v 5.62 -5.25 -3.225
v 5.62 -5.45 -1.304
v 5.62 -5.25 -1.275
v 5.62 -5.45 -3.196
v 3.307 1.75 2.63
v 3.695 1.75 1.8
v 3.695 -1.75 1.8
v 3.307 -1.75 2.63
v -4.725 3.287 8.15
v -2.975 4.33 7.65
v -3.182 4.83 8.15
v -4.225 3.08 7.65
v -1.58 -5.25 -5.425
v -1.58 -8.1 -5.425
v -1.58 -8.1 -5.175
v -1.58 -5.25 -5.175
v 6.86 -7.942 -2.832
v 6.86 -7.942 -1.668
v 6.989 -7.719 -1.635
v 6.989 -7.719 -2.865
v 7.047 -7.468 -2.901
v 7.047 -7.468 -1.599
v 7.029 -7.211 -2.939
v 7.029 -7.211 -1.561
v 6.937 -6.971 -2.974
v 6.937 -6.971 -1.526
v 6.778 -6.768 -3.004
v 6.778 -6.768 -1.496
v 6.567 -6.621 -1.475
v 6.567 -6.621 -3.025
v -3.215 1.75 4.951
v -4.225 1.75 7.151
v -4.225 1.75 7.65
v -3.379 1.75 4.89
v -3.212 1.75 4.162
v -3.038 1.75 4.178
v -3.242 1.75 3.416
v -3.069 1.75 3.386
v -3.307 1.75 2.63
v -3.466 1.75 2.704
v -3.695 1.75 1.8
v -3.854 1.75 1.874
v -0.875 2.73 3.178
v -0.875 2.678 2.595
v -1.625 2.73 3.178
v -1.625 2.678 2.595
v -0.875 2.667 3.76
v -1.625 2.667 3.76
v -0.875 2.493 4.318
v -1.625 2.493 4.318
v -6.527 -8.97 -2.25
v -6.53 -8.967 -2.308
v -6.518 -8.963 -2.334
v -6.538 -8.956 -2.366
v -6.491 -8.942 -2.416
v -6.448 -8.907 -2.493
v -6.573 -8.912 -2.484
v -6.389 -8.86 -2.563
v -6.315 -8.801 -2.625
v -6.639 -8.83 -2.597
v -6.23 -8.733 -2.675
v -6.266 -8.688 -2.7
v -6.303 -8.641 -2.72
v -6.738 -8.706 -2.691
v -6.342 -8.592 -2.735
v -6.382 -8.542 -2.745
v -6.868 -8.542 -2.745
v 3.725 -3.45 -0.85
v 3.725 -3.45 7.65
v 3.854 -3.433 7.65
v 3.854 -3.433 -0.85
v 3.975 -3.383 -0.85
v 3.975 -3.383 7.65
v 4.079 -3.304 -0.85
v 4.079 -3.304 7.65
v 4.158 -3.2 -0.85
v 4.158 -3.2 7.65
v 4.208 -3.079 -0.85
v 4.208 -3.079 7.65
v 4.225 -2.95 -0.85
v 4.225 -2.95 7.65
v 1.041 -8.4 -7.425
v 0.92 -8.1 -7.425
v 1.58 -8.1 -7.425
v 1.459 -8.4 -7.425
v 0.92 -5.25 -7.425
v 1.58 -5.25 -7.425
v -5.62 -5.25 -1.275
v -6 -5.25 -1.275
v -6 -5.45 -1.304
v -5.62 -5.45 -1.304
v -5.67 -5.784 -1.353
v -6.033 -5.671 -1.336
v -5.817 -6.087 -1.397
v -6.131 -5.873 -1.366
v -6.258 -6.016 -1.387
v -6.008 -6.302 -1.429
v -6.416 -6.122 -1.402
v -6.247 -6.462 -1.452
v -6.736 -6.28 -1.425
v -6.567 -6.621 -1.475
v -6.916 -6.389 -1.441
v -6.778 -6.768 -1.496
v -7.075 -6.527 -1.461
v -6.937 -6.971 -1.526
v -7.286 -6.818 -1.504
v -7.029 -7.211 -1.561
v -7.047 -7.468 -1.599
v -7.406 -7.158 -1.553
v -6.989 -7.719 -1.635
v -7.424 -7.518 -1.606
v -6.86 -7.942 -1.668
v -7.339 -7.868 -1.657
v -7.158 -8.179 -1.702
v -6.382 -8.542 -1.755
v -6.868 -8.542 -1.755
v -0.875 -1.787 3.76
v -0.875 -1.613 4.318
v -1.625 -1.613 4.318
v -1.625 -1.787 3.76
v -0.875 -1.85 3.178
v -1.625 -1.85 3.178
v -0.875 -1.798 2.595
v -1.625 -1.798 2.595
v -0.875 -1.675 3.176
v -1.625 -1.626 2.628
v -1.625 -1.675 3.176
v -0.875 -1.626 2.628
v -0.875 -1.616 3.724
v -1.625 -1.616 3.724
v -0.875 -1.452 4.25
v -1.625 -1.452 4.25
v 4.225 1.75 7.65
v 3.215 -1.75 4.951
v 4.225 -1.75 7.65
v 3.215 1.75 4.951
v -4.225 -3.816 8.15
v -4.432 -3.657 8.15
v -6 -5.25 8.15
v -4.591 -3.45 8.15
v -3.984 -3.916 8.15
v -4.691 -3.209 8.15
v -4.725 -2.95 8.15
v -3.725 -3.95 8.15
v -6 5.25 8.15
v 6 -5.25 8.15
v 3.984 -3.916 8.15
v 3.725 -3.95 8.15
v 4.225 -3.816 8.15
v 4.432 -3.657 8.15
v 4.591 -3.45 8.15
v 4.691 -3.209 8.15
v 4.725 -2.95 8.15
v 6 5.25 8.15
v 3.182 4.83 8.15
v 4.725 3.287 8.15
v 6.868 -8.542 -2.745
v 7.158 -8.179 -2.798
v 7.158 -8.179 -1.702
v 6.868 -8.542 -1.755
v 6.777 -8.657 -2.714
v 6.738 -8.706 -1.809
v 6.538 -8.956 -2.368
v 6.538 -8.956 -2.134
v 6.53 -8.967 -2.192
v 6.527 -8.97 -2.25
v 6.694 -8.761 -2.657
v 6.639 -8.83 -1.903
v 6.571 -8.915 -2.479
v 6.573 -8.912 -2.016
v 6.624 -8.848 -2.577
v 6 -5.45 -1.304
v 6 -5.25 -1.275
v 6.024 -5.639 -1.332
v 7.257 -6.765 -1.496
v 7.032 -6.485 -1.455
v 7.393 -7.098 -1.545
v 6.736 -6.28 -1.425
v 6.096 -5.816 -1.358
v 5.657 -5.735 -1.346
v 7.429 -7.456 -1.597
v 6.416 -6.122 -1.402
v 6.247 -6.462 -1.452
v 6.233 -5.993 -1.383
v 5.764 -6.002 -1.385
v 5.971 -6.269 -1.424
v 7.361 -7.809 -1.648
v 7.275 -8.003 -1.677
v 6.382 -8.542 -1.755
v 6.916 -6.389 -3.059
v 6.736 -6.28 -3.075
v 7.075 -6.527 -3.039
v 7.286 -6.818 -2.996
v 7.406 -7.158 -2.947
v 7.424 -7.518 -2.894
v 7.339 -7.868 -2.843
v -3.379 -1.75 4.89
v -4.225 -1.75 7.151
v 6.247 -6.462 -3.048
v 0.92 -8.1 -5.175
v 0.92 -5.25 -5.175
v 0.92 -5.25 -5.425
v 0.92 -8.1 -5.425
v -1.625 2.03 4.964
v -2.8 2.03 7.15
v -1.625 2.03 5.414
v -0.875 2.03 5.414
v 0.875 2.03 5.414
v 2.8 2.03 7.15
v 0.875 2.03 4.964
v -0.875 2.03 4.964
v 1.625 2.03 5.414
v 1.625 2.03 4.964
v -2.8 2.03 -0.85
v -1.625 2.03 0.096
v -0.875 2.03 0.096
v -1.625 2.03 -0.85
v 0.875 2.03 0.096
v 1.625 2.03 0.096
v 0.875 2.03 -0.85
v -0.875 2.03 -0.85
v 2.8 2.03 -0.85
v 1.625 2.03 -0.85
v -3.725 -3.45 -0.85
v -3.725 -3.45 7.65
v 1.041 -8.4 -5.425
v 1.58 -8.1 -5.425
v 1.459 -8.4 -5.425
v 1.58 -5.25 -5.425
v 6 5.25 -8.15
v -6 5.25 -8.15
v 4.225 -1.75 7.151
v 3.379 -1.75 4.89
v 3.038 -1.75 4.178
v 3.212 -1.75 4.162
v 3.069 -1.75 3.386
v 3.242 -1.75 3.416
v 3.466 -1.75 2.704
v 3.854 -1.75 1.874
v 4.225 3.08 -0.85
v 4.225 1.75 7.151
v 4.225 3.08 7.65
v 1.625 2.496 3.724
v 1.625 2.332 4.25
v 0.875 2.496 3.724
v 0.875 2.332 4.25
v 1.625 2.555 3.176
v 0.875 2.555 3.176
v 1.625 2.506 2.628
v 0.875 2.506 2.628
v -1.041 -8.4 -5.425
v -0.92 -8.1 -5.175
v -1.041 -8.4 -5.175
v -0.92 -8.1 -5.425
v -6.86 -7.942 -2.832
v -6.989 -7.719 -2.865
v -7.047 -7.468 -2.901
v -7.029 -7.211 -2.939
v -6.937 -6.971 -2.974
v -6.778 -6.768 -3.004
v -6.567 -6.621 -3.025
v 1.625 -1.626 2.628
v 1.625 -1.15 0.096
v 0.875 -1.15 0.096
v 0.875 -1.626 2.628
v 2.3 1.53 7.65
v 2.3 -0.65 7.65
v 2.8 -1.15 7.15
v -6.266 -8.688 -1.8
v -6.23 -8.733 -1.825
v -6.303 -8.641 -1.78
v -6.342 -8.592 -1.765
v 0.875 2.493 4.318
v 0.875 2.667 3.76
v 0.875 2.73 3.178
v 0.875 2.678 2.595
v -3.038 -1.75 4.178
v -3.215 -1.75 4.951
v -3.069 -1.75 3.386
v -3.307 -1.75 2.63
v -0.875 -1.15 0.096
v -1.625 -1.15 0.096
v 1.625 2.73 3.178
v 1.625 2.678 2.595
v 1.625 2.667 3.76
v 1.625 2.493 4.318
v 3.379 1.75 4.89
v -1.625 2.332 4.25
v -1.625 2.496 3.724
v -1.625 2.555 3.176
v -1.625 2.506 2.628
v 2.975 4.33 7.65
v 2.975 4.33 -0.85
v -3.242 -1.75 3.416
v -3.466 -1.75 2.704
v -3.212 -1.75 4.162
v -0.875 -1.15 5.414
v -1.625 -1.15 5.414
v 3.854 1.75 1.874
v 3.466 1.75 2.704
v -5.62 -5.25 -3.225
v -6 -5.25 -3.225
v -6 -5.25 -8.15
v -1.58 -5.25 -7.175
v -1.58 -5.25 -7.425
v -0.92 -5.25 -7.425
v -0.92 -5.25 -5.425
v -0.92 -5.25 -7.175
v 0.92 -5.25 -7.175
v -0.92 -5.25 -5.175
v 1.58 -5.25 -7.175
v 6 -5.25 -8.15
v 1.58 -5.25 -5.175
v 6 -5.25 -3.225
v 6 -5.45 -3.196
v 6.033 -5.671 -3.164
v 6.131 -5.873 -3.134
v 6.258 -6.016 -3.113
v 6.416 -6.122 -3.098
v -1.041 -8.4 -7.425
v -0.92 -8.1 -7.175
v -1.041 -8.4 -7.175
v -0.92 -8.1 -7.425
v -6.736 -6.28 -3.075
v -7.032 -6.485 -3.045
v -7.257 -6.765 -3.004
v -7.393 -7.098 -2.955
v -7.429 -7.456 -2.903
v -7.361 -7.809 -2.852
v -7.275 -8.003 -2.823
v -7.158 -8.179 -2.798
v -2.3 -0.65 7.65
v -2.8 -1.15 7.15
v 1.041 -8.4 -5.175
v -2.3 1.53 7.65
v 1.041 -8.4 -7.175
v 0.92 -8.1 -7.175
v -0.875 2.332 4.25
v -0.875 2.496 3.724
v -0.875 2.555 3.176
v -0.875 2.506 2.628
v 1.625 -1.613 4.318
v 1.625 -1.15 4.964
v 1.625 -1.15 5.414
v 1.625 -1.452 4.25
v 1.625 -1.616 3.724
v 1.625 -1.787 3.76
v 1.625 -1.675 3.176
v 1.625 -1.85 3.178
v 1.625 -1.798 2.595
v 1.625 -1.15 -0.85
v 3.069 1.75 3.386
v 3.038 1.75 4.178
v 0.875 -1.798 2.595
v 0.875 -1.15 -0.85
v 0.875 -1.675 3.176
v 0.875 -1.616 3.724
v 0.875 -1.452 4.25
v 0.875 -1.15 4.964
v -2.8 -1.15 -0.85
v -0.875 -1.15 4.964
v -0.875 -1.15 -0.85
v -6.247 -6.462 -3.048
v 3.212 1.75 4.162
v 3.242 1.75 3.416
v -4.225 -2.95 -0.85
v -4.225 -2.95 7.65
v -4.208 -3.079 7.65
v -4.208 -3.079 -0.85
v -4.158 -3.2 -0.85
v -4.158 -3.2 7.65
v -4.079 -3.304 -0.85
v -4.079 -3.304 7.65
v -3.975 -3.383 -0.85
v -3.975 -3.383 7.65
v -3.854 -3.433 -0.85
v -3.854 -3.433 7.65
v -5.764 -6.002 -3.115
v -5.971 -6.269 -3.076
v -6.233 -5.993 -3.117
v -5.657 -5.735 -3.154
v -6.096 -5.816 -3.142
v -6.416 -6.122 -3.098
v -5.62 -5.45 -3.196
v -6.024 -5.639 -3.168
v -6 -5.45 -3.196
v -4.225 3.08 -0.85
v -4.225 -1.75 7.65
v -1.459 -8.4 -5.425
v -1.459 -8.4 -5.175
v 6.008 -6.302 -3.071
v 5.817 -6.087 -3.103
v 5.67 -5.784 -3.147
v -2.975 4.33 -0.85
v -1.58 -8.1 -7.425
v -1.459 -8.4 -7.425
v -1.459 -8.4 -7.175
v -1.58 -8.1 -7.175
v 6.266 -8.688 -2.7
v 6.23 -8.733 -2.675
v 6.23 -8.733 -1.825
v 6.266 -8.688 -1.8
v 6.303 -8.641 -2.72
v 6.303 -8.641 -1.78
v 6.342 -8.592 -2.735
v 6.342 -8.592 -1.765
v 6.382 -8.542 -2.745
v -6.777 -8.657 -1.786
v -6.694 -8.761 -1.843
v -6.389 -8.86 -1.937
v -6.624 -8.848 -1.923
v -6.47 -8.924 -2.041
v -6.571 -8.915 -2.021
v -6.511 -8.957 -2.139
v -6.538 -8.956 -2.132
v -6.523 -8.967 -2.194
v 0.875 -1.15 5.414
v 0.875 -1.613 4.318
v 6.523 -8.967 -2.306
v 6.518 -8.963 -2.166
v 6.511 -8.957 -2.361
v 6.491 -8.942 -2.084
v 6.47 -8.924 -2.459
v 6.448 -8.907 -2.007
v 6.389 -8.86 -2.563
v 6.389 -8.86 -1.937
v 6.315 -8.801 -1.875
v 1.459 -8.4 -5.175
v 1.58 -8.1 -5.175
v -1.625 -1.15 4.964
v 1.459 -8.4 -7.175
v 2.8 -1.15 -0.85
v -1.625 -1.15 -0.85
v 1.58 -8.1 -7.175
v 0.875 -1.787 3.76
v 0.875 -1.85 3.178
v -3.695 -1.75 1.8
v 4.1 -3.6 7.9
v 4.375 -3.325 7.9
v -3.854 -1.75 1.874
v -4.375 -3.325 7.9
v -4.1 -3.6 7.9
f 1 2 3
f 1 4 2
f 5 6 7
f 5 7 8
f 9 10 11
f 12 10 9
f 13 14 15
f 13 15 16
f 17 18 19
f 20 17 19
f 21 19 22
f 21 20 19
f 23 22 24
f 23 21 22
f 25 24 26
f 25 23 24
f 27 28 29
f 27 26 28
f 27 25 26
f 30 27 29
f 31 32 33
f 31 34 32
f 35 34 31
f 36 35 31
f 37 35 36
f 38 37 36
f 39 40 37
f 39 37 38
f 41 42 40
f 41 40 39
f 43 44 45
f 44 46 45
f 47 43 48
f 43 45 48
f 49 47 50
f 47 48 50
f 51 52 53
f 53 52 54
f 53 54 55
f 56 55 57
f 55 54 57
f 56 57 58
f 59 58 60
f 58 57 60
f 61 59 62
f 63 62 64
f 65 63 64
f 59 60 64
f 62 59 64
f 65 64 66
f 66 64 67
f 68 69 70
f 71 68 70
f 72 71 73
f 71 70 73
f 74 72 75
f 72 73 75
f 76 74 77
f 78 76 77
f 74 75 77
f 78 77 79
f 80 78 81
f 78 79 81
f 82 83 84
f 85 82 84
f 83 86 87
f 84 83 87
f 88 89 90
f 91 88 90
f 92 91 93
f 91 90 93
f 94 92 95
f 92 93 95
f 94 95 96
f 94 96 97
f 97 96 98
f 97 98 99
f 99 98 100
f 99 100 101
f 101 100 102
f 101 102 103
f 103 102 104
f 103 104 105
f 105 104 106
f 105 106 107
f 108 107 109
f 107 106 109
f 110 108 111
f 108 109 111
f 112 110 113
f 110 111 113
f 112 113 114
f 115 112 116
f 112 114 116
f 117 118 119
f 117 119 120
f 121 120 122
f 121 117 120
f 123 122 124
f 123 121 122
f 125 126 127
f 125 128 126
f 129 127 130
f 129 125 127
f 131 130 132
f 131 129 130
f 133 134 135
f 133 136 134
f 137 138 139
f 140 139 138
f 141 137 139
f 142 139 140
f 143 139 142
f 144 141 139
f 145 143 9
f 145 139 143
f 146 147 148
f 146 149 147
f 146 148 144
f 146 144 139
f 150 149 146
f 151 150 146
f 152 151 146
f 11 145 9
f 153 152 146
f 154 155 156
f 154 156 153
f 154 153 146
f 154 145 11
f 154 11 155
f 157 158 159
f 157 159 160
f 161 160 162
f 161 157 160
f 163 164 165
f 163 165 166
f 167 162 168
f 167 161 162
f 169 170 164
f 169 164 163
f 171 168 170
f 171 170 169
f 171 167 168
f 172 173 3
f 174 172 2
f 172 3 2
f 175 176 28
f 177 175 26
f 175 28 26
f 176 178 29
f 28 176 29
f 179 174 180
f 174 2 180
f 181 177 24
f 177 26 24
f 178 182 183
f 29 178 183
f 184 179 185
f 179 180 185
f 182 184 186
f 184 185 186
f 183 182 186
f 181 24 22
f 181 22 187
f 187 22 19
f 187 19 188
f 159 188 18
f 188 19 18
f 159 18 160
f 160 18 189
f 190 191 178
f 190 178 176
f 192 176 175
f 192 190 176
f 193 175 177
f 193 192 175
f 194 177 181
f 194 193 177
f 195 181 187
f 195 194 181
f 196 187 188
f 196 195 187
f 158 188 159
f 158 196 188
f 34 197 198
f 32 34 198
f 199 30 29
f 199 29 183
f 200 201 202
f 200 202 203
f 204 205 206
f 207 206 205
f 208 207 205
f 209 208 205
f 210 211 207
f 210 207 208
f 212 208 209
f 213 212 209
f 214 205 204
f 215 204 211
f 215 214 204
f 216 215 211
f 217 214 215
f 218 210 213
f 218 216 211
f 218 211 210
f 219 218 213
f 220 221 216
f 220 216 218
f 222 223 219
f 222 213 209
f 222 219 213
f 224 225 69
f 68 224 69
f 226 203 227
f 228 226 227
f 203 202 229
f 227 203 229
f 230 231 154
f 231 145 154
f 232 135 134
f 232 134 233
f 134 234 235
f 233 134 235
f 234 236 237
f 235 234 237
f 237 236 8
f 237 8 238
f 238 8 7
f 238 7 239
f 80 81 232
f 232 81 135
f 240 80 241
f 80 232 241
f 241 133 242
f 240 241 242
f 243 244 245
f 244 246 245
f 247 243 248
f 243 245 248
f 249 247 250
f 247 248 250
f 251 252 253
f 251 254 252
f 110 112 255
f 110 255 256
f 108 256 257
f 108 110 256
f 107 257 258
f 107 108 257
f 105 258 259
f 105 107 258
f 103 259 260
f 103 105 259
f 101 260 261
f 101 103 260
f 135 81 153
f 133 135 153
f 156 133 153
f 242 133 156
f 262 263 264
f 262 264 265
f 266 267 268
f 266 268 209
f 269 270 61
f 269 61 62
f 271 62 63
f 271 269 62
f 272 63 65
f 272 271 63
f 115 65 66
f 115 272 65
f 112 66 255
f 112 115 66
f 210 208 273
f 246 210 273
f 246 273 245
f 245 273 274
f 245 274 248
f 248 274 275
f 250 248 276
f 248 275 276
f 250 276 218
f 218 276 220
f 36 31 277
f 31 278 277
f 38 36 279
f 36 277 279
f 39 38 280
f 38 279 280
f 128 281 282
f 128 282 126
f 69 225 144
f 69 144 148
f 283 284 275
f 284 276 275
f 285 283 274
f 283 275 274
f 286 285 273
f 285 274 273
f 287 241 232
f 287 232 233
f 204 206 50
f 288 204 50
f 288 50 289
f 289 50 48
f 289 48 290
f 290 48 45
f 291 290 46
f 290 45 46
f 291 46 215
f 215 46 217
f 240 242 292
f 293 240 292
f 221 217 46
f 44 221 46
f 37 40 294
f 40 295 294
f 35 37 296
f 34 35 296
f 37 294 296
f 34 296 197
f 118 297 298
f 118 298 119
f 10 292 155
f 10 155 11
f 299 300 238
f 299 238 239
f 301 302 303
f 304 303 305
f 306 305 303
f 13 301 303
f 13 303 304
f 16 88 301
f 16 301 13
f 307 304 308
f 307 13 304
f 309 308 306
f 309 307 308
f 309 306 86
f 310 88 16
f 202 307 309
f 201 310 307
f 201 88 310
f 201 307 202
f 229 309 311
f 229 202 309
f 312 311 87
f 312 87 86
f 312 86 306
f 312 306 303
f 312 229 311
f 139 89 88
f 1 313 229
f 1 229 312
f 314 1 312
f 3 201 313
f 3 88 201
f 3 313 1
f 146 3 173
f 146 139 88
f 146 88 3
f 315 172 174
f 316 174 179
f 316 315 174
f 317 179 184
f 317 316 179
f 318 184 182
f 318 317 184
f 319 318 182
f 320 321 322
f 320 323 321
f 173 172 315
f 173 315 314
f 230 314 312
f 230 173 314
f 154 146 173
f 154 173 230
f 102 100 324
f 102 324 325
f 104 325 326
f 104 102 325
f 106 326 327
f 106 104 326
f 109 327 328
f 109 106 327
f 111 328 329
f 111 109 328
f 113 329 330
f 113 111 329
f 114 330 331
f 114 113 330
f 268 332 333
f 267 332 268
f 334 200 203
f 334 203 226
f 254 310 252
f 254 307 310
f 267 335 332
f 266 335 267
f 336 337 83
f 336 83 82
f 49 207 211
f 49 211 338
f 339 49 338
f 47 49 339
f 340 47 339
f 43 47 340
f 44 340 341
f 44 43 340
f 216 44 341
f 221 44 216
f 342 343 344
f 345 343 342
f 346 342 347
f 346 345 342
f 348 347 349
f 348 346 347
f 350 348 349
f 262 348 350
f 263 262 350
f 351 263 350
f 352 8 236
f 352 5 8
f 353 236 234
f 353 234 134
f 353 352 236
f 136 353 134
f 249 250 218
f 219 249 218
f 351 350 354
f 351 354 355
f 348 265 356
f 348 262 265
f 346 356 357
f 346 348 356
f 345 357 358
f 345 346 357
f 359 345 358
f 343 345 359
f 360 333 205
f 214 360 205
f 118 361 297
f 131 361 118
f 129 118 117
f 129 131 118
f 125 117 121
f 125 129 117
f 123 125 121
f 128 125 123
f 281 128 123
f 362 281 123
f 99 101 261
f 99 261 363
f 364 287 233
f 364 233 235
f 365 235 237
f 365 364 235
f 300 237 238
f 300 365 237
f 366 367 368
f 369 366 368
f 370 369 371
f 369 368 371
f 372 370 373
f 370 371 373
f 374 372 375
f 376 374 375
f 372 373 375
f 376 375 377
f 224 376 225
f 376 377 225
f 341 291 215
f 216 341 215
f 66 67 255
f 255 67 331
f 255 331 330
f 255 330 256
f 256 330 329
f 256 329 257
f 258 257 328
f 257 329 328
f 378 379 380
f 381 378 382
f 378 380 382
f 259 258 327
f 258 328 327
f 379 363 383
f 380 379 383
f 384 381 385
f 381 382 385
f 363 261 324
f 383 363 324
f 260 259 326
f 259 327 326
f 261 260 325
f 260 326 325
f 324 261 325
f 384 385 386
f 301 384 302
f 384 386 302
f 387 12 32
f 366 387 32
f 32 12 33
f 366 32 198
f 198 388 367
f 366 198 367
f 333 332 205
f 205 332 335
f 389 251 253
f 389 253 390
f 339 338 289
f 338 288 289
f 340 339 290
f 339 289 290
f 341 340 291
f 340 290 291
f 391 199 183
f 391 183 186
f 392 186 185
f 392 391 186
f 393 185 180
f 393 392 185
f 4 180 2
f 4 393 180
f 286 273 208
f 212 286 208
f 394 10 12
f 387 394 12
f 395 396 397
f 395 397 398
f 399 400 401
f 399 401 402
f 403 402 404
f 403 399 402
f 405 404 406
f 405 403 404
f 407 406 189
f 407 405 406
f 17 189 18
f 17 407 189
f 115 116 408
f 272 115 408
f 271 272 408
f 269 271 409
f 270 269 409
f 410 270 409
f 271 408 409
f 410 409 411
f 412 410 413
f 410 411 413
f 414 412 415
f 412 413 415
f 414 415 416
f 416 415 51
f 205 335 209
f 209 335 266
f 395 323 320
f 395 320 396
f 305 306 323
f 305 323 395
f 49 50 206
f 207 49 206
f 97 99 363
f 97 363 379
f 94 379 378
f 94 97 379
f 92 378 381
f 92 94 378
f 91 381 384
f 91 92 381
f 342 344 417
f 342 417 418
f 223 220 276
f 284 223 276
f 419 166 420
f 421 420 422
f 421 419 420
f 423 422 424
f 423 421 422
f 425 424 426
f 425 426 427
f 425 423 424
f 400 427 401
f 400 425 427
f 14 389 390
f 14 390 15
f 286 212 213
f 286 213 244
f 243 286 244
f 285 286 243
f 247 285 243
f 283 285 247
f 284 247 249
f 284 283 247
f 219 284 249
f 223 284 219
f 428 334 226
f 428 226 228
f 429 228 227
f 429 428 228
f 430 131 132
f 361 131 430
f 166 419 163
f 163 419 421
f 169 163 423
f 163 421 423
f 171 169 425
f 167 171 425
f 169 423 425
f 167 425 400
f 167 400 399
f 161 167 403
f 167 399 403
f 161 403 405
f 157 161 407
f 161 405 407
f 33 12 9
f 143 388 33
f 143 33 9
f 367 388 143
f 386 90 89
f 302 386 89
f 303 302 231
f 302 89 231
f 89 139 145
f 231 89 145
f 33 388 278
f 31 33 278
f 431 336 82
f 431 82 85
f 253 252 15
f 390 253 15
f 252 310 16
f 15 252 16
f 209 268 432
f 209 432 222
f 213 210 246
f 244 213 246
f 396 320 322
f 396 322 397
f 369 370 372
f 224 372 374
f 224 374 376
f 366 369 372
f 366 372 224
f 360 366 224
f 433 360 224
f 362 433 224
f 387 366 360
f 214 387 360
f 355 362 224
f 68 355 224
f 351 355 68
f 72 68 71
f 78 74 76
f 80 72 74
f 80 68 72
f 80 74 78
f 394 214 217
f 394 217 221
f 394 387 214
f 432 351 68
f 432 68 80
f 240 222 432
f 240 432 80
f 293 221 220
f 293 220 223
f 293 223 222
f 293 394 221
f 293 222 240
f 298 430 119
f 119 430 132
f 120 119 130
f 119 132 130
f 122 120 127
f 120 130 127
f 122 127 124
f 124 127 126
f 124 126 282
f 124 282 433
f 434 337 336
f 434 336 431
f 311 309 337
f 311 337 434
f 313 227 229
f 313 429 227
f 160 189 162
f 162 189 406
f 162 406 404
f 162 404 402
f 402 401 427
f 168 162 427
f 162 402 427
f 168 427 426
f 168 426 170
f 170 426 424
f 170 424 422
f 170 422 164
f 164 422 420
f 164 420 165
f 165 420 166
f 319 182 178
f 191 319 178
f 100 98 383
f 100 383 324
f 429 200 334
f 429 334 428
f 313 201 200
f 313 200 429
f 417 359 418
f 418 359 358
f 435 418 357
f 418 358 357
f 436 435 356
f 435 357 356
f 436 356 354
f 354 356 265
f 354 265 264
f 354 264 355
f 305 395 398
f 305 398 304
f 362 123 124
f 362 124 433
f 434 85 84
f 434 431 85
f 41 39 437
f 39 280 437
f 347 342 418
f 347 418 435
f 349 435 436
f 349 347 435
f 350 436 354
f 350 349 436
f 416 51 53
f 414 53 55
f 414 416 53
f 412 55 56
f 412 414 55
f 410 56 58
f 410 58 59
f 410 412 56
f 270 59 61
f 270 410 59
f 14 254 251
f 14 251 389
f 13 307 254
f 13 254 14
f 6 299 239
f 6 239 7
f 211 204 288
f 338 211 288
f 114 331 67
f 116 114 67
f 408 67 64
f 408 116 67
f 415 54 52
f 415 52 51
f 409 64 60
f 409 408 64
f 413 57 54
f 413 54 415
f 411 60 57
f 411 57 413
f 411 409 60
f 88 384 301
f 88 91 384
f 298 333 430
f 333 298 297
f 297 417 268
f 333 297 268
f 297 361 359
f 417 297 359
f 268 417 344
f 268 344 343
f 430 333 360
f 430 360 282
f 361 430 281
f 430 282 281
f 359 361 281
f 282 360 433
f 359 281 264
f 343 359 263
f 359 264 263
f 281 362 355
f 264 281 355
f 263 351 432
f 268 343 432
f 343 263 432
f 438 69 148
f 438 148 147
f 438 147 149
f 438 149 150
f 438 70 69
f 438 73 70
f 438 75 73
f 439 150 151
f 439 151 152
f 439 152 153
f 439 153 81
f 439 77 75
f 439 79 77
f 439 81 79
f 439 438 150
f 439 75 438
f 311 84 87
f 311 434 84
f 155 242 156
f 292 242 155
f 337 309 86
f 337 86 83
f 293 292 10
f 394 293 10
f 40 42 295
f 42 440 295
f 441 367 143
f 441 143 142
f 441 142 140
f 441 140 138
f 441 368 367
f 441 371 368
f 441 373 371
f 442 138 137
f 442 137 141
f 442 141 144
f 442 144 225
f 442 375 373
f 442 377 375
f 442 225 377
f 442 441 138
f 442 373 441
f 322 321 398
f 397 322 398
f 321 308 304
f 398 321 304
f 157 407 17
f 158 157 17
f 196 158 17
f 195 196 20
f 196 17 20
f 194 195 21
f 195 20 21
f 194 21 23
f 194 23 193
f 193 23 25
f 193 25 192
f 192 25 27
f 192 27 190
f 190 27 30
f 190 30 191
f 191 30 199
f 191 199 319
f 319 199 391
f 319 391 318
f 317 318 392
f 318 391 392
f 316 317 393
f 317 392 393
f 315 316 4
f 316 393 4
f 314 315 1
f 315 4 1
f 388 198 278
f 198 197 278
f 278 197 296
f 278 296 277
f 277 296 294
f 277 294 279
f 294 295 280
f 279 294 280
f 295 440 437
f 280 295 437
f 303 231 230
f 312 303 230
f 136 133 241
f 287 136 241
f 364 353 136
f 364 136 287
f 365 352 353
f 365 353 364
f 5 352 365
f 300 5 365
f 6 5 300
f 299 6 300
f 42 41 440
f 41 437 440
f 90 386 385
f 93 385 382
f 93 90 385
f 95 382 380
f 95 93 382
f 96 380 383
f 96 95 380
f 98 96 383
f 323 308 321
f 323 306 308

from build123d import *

# Parameters (mm, degrees)
SKETCH1_W                      = 12
SKETCH1_H                      = 10.5
BASE_DEPTH                     = 8.15
CONTACT_OPENING_DEPTH          = 9
CONTACT_OPENING_LEAD_IN_SIZE   = 0.5
SKETCH3_W                      = 5.6
SKETCH3_H                      = 3.18
CONTACT_AREA_DEPTH             = 8.5
CONTACT_AREA_LEAD_IN_SIZE      = 0.5
HOLDING_TINES_DEPTH            = 1.75
CONTACT_DEPTH                  = 0.375
CONTACT_PATTERN_COUNT          = 2
CONTACT_PATTERN_PITCH          = 2.5
TH_GROUND_LEGS_DEPTH           = 0.975
TH_GROUND_LEG_SHAPE_DEPTH      = 15.215776447
TH_GROUND_LEG_SHAPE_DEPTH_BACK = 15.215776447
TH_TAILS_DEPTH                 = 0.125
TH_TAILS_PATTERN_COUNT         = 2
TH_TAILS_PATTERN_PITCH         = 2


with BuildPart() as part:
    # Sketch1 → Base (new, symmetric)
    with BuildSketch(Plane.XY):
        Rectangle(SKETCH1_W, SKETCH1_H)
    extrude(amount=BASE_DEPTH, both=True)

    # Sketch2 → Contact Opening (cut)
    with BuildSketch(Plane.XY.offset(8.15)):
        with BuildLine():
            Line((-2.975, 4.33), (-4.225, 3.08))
            Line((-4.225, 3.08), (-4.225, -2.95))
            ThreePointArc((-4.225, -2.95), (-4.078553391, -3.303553391), (-3.725, -3.45))
            Line((-3.725, -3.45), (3.725, -3.45))
            ThreePointArc((3.725, -3.45), (4.078553391, -3.303553391), (4.225, -2.95))
            Line((4.225, -2.95), (4.225, 3.08))
            Line((4.225, 3.08), (2.975, 4.33))
            Line((2.975, 4.33), (-2.975, 4.33))
        make_face()
    extrude(amount=-CONTACT_OPENING_DEPTH, mode=Mode.SUBTRACT)

    # Contact Opening Lead-in
    contact_opening_lead_in_edges = [part.edges().sort_by_distance(p)[0] for p in [
        (0, 4.33, 8.15),
        (-3.6, 3.705, 8.15),
        (-4.225, 0.065, 8.15),
        (-4.078553391, -3.303553391, 8.15),
        (0, -3.45, 8.15),
        (4.078553391, -3.303553391, 8.15),
        (4.225, 0.065, 8.15),
        (3.6, 3.705, 8.15),
    ]]
    chamfer(contact_opening_lead_in_edges, length=CONTACT_OPENING_LEAD_IN_SIZE)

    # Sketch3 → Contact Area (add)
    with BuildSketch(Plane.XY.offset(-0.85)):
        with Locations((0, 0.44)):
            Rectangle(SKETCH3_W, SKETCH3_H)
    extrude(amount=CONTACT_AREA_DEPTH)

    # Contact Area Lead-in
    contact_area_lead_in_edges = [part.edges().sort_by_distance(p)[0] for p in [
        (-2.8, 0.44, 7.65),
        (0, -1.15, 7.65),
        (2.8, 0.44, 7.65),
        (0, 2.03, 7.65),
    ]]
    chamfer(contact_area_lead_in_edges, length=CONTACT_AREA_LEAD_IN_SIZE)

    # Sketch7 → Holding Tines (add, symmetric)
    with BuildSketch(Plane(origin=(0, 0, 0), x_dir=(1, 0, 0), z_dir=(0, 1, 0))):
        with BuildLine():
            Line((-4.225, -7.65), (-3.215243234, -4.951316752))
            ThreePointArc((-3.215243234, -4.951316752), (-3.027350135, -3.781276433), (-3.307189725, -2.629760924))
            Line((-3.307189725, -2.629760924), (-3.695, -1.8))
            Line((-3.695, -1.8), (-3.853538933, -1.874097279))
            Line((-3.853538933, -1.874097279), (-3.465728658, -2.703858203))
            ThreePointArc((-3.465728658, -2.703858203), (-3.202213044, -3.788201975), (-3.379145712, -4.889989942))
            Line((-3.379145712, -4.889989942), (-4.388902478, -7.588673189))
            Line((-4.388902478, -7.588673189), (-4.225, -7.65))
        make_face()
        with BuildLine():
            Line((4.225, -7.65), (4.388902478, -7.588673189))
            Line((4.388902478, -7.588673189), (3.379145712, -4.889989942))
            ThreePointArc((3.379145712, -4.889989942), (3.202213044, -3.788201975), (3.465728658, -2.703858203))
            Line((3.465728658, -2.703858203), (3.853538933, -1.874097279))
            Line((3.853538933, -1.874097279), (3.695, -1.8))
            Line((3.695, -1.8), (3.307189725, -2.629760924))
            ThreePointArc((3.307189725, -2.629760924), (3.027350135, -3.781276433), (3.215243234, -4.951316752))
            Line((3.215243234, -4.951316752), (4.225, -7.65))
        make_face()
    extrude(amount=HOLDING_TINES_DEPTH, both=True)

    # Sketch8 → Contact (add, symmetric)
    with BuildSketch(Plane(origin=(-1.25, 0, 0), x_dir=(0, 0, -1), z_dir=(1, 0, 0))):
        with BuildLine():
            Line((0.85, 2.03), (-2.595251124, 2.678262825))
            ThreePointArc((-2.595251124, 2.678262825), (-3.47053143, 2.712827451), (-4.318484282, 2.493086043))
            Line((-4.318484282, 2.493086043), (-5.65, 1.93))
            Line((-5.65, 1.93), (-5.581838417, 1.768819981))
            Line((-5.581838417, 1.768819981), (-4.250322699, 2.331906024))
            ThreePointArc((-4.250322699, 2.331906024), (-3.451833763, 2.538829183), (-2.627611475, 2.506280827))
            Line((-2.627611475, 2.506280827), (0.817639649, 1.858018002))
            Line((0.817639649, 1.858018002), (0.85, 2.03))
        make_face()
        with BuildLine():
            Line((-5.581838417, -0.888819981), (-5.65, -1.05))
            Line((-5.65, -1.05), (-4.318484282, -1.613086043))
            ThreePointArc((-4.318484282, -1.613086043), (-3.47053143, -1.832827451), (-2.595251124, -1.798262825))
            Line((-2.595251124, -1.798262825), (0.85, -1.15))
            Line((0.85, -1.15), (0.817639649, -0.978018002))
            Line((0.817639649, -0.978018002), (-2.627611475, -1.626280827))
            ThreePointArc((-2.627611475, -1.626280827), (-3.451833763, -1.658829183), (-4.250322699, -1.451906024))
            Line((-4.250322699, -1.451906024), (-5.581838417, -0.888819981))
        make_face()
    contact = extrude(amount=CONTACT_DEPTH, both=True)

    # Contact Pattern: Contact ×2
    with Locations(*[(i * CONTACT_PATTERN_PITCH, 0, 0) for i in range(1, CONTACT_PATTERN_COUNT)]):
        add(contact)

    # Sketch13 → TH Ground Legs (add, symmetric)
    with BuildSketch(Plane.XY.offset(-2.25)):
        with BuildLine():
            Line((6, -5.25), (6, -5.45))
            ThreePointArc((6, -5.45), (6.112536174, -5.84514538), (6.41637299, -6.121709028))
            Line((6.41637299, -6.121709028), (6.736045017, -6.280484954))
            ThreePointArc((6.736045017, -6.280484954), (7.400291967, -7.129098698), (7.157524757, -8.179066973))
            Line((7.157524757, -8.179066973), (6.527167526, -8.97))
            Line((6.527167526, -8.97), (6.23, -8.73316364))
            Line((6.23, -8.73316364), (6.860357231, -7.942230613))
            ThreePointArc((6.860357231, -7.942230613), (7.029323209, -7.211452694), (6.567007332, -6.620817528))
            Line((6.567007332, -6.620817528), (6.247335304, -6.462041602))
            ThreePointArc((6.247335304, -6.462041602), (5.789554503, -6.045352372), (5.62, -5.45))
            Line((5.62, -5.45), (5.62, -5.25))
            Line((5.62, -5.25), (6, -5.25))
        make_face()
        with BuildLine():
            Line((-5.62, -5.25), (-6, -5.25))
            Line((-6, -5.25), (-6, -5.45))
            ThreePointArc((-6, -5.45), (-6.112536174, -5.84514538), (-6.41637299, -6.121709028))
            Line((-6.41637299, -6.121709028), (-6.736045017, -6.280484954))
            ThreePointArc((-6.736045017, -6.280484954), (-7.400291967, -7.129098698), (-7.157524757, -8.179066973))
            Line((-7.157524757, -8.179066973), (-6.527167526, -8.97))
            Line((-6.527167526, -8.97), (-6.23, -8.73316364))
            Line((-6.23, -8.73316364), (-6.860357231, -7.942230613))
            ThreePointArc((-6.860357231, -7.942230613), (-7.029323209, -7.211452694), (-6.567007332, -6.620817528))
            Line((-6.567007332, -6.620817528), (-6.247335304, -6.462041602))
            ThreePointArc((-6.247335304, -6.462041602), (-5.789554503, -6.045352372), (-5.62, -5.45))
            Line((-5.62, -5.45), (-5.62, -5.25))
        make_face()
    extrude(amount=TH_GROUND_LEGS_DEPTH, both=True)

    # Sketch14 → TH Ground Leg Shape (cut, two sides: drawn at the far end of the back side and taken through both)
    with BuildSketch(Plane(origin=(0, 0, 0), x_dir=(0, 0, -1), z_dir=(1, 0, 0)).offset(-TH_GROUND_LEG_SHAPE_DEPTH_BACK)):
        with BuildLine():
            Line((3.225, -5.25), (3.225, -9))
            Line((3.225, -9), (1.275, -9))
            Line((1.275, -9), (1.275, -5.25))
            Line((1.275, -5.25), (1.755236252, -8.542172253))
            ThreePointArc((1.755236252, -8.542172253), (2.25, -8.97), (2.744763748, -8.542172253))
            Line((2.744763748, -8.542172253), (3.225, -5.25))
        make_face()
    extrude(amount=TH_GROUND_LEG_SHAPE_DEPTH + TH_GROUND_LEG_SHAPE_DEPTH_BACK, mode=Mode.SUBTRACT)

    # Sketch15 → TH Tails (add, symmetric)
    with BuildSketch(Plane(origin=(0, 0, -7.3), x_dir=(-1, 0, 0), z_dir=(0, 0, -1))):
        Polygon((-1.58, -5.25), (-0.92, -5.25), (-0.92, -8.1), (-1.041207868, -8.4), (-1.458792132, -8.4), (-1.58, -8.1), align=None)
        Polygon((0.92, -8.1), (1.041207868, -8.4), (1.458792132, -8.4), (1.58, -8.1), (1.58, -5.25), (0.92, -5.25), align=None)
    th_tails = extrude(amount=TH_TAILS_DEPTH, both=True)

    # TH Tails Pattern: TH Tails ×2
    with Locations(*[(0, 0, i * TH_TAILS_PATTERN_PITCH) for i in range(1, TH_TAILS_PATTERN_COUNT)]):
        add(th_tails)


solid = part.part
